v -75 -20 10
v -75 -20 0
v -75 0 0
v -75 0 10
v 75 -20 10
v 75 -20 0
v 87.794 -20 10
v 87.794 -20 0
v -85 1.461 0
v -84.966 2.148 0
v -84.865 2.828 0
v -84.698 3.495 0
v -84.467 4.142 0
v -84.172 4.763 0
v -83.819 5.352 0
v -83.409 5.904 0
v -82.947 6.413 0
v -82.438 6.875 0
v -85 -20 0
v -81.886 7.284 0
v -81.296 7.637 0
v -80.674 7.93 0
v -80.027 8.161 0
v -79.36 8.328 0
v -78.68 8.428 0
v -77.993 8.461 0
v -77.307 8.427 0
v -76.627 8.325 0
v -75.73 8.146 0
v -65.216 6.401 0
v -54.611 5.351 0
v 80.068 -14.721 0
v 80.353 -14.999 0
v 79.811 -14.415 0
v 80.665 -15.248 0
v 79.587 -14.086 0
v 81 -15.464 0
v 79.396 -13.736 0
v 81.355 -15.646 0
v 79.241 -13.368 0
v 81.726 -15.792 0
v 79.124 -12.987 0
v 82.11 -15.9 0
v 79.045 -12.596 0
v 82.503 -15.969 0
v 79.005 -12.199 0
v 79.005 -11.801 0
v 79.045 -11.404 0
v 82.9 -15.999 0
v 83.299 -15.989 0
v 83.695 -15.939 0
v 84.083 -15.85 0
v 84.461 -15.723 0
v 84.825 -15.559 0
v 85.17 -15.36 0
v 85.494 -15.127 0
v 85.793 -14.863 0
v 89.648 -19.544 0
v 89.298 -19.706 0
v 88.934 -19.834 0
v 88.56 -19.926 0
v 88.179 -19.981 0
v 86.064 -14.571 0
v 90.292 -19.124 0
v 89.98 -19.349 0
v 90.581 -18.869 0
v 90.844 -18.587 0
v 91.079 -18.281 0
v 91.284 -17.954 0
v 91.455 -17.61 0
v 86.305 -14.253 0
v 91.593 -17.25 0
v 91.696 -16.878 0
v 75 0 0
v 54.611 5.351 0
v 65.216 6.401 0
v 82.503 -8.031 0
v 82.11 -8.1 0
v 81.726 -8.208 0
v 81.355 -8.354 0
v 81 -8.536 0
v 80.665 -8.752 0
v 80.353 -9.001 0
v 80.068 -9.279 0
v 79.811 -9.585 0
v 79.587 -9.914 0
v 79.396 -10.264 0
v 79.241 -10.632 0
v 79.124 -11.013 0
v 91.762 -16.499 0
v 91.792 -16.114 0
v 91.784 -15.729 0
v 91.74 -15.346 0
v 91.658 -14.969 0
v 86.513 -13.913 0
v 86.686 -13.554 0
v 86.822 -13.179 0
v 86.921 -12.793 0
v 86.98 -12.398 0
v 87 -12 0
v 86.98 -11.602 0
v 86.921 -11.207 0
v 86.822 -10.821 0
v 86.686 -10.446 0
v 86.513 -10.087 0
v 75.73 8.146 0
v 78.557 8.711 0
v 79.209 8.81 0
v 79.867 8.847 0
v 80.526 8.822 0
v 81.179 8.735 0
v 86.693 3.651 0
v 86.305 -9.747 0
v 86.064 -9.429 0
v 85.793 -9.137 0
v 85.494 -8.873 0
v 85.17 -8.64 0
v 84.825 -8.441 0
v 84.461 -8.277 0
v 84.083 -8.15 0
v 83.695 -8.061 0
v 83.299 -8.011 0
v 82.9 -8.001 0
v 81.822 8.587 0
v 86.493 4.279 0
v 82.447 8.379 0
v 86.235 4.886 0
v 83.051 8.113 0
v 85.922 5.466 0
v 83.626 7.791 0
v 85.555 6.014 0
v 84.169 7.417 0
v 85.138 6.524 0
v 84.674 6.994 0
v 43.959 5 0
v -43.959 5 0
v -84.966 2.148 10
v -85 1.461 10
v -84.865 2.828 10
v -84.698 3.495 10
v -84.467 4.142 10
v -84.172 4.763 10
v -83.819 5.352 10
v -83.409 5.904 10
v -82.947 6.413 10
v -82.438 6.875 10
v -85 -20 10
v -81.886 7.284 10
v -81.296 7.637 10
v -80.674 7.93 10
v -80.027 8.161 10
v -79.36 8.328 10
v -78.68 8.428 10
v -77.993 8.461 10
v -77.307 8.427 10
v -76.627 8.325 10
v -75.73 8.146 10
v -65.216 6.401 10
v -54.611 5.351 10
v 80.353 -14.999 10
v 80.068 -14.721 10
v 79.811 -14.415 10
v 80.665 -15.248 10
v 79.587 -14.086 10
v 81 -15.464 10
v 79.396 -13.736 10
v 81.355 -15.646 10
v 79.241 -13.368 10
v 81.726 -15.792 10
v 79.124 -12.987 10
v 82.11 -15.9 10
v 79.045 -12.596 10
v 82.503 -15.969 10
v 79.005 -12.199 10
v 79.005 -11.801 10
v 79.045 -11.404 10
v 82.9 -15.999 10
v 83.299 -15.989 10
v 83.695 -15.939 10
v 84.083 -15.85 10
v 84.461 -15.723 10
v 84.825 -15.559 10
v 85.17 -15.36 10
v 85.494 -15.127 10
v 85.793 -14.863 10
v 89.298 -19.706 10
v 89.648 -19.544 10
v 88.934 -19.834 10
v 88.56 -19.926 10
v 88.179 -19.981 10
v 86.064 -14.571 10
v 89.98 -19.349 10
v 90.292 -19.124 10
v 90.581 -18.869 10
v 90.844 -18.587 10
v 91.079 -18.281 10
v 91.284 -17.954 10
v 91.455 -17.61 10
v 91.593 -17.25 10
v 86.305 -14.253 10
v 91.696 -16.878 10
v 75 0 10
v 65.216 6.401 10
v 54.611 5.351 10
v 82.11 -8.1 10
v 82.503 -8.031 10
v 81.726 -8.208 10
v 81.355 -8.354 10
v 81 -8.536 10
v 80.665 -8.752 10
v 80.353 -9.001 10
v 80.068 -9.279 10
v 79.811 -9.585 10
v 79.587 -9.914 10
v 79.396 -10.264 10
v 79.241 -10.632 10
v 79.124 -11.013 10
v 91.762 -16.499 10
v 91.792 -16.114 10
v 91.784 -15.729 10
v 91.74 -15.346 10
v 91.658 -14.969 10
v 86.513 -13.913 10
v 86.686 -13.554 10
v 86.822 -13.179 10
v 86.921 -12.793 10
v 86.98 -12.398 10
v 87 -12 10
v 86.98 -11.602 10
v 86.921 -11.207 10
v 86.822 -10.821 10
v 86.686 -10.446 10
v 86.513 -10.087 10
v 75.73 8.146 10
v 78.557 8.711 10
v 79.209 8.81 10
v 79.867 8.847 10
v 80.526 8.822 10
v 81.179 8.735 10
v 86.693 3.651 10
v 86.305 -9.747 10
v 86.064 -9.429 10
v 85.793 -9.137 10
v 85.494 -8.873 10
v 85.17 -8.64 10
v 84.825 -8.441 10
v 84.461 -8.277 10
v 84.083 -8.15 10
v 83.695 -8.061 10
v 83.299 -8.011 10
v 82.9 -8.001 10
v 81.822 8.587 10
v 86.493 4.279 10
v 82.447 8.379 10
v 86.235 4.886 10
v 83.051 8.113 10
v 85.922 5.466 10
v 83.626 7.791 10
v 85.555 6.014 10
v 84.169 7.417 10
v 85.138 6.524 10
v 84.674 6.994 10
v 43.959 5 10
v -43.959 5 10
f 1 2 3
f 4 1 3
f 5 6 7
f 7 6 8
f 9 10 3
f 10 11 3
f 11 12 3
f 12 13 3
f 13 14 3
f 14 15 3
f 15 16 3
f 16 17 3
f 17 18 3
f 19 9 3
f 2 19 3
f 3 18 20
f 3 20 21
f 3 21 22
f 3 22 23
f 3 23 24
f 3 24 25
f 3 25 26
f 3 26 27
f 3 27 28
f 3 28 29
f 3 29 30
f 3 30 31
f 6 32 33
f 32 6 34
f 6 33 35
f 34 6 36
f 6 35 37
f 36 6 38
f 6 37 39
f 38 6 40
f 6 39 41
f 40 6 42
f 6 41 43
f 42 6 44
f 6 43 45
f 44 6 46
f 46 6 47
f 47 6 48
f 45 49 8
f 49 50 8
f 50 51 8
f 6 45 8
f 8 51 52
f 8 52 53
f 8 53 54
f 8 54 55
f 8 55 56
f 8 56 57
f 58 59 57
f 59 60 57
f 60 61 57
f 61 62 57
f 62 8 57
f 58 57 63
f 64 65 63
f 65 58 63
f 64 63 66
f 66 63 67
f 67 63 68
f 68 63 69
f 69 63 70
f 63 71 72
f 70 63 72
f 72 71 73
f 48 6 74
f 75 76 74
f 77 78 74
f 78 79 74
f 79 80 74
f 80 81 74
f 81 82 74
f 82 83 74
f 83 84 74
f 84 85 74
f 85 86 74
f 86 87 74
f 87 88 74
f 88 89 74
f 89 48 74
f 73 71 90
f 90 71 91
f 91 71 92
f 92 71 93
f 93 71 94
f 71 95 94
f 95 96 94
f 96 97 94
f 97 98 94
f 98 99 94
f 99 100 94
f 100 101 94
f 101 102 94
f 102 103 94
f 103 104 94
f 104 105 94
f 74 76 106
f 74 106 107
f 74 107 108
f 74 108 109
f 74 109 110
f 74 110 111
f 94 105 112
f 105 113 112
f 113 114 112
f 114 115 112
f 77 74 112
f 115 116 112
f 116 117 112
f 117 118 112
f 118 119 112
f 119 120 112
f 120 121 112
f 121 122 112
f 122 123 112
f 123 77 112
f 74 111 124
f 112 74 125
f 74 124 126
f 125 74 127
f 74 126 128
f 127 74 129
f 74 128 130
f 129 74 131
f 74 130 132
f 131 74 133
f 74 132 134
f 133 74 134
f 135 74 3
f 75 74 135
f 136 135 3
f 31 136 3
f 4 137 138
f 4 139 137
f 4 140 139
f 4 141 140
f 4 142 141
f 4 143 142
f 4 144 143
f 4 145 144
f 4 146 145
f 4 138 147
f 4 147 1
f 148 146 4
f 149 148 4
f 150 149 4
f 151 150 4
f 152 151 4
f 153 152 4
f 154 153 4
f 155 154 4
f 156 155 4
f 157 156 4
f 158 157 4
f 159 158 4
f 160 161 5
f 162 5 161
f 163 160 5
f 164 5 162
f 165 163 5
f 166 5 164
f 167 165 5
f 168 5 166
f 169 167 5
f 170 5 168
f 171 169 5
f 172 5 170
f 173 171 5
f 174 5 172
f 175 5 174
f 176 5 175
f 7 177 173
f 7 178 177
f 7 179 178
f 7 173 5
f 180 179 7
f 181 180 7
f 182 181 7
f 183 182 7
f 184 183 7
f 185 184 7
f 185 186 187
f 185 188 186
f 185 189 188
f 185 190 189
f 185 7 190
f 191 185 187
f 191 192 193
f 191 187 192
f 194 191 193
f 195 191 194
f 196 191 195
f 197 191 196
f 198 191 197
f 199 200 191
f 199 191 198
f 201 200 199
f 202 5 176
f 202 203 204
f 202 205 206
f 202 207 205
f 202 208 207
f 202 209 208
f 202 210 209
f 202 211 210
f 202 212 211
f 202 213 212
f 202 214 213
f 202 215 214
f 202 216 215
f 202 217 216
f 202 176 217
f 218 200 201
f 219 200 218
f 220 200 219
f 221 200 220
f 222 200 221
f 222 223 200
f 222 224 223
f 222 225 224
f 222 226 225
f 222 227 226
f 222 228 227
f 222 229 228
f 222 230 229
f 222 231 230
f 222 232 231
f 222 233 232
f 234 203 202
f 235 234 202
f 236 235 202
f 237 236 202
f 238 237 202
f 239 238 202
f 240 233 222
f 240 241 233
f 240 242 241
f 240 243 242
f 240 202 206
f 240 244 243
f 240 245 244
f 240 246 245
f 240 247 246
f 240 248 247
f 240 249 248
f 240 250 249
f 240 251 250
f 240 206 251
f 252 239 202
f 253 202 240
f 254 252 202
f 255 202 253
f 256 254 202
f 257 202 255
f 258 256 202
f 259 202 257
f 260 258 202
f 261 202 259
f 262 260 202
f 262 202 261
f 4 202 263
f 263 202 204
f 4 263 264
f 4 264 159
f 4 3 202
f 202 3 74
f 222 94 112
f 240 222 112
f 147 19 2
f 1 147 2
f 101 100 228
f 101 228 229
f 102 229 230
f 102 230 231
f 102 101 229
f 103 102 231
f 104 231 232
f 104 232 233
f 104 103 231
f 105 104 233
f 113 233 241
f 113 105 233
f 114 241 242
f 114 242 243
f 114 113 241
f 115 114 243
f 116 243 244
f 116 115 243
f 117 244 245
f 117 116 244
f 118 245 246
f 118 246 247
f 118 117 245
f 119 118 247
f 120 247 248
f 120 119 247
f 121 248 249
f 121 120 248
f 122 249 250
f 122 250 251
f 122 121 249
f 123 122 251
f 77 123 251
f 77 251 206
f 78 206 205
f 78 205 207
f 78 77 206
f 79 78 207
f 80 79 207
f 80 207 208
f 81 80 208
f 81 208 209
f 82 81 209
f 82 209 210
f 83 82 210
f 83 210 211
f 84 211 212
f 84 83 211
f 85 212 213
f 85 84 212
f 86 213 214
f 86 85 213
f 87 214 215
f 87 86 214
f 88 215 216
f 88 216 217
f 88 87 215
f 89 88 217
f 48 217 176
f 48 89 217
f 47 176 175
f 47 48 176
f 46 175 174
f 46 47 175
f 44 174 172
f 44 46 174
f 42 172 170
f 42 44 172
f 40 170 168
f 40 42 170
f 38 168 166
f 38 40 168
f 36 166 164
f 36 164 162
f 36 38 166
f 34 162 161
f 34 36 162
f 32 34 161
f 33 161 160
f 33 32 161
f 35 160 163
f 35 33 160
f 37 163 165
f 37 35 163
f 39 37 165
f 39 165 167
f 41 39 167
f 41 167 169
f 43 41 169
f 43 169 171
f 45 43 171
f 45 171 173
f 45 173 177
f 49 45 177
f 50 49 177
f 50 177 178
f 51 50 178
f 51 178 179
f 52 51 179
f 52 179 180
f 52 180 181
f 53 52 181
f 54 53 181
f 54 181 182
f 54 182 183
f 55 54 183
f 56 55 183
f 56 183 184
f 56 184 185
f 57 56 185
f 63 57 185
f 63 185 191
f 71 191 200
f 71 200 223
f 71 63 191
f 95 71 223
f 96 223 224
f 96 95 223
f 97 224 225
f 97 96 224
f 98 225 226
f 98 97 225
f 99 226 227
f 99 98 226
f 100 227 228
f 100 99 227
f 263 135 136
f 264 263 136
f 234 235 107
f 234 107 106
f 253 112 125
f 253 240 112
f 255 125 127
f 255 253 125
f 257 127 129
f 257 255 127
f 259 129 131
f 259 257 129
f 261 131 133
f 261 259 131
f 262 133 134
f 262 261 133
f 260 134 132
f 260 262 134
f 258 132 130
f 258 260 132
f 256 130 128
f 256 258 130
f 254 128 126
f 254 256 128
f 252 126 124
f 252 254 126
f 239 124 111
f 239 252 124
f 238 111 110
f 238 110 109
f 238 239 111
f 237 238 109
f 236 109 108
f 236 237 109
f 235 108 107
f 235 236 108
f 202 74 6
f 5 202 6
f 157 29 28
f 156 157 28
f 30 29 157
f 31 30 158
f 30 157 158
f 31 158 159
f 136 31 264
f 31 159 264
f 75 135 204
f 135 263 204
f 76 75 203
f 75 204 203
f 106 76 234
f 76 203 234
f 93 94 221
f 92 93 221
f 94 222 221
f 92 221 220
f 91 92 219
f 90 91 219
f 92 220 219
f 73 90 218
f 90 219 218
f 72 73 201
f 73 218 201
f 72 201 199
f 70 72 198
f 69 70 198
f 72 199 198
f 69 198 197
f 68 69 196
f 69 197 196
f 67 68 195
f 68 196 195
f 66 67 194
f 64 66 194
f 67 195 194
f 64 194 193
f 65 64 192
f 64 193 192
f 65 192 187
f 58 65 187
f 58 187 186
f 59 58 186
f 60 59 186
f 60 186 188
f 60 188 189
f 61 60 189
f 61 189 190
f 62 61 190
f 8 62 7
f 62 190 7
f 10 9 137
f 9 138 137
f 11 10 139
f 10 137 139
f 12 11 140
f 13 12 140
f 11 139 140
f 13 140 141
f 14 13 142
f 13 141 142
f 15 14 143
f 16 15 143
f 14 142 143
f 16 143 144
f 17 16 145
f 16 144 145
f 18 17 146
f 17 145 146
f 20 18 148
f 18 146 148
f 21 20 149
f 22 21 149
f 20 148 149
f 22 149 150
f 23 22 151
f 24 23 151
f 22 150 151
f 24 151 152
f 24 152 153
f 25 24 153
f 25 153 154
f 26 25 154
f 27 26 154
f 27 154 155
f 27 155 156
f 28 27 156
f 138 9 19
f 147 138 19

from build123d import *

# Parameters (mm, degrees)
SKETCH_R    = 4
PAD_DEPTH   = 10
FILLET_R    = 7
FILLET001_R = 162
FILLET002_R = 4


with BuildPart() as part:
    # Sketch → Pad (new body)
    with BuildSketch(Plane.XY):
        Polygon((-75, -20), (-75, 0), (75, 0), (75, -20), (93, -20), (85, 10), (60, 5), (-60, 5), (-85, 10), (-85, -20), align=None)
        with Locations((83, -12)):
            Circle(SKETCH_R, mode=Mode.SUBTRACT)
    extrude(amount=PAD_DEPTH)

    # Fillet
    fillet_edges = [part.edges().sort_by_distance(p)[0] for p in [
        (85, 10, 5),
        (-85, 10, 5),
    ]]
    fillet(fillet_edges, radius=FILLET_R)

    # Fillet001
    fillet001_edges = [part.edges().sort_by_distance(p)[0] for p in [
        (-60, 5, 5),
        (60, 5, 5),
    ]]
    fillet(fillet001_edges, radius=FILLET001_R)

    # Fillet002
    fillet002_edges = [part.edges().sort_by_distance(p)[0] for p in [
        (93, -20, 5),
    ]]
    fillet(fillet002_edges, radius=FILLET002_R)


solid = part.part
